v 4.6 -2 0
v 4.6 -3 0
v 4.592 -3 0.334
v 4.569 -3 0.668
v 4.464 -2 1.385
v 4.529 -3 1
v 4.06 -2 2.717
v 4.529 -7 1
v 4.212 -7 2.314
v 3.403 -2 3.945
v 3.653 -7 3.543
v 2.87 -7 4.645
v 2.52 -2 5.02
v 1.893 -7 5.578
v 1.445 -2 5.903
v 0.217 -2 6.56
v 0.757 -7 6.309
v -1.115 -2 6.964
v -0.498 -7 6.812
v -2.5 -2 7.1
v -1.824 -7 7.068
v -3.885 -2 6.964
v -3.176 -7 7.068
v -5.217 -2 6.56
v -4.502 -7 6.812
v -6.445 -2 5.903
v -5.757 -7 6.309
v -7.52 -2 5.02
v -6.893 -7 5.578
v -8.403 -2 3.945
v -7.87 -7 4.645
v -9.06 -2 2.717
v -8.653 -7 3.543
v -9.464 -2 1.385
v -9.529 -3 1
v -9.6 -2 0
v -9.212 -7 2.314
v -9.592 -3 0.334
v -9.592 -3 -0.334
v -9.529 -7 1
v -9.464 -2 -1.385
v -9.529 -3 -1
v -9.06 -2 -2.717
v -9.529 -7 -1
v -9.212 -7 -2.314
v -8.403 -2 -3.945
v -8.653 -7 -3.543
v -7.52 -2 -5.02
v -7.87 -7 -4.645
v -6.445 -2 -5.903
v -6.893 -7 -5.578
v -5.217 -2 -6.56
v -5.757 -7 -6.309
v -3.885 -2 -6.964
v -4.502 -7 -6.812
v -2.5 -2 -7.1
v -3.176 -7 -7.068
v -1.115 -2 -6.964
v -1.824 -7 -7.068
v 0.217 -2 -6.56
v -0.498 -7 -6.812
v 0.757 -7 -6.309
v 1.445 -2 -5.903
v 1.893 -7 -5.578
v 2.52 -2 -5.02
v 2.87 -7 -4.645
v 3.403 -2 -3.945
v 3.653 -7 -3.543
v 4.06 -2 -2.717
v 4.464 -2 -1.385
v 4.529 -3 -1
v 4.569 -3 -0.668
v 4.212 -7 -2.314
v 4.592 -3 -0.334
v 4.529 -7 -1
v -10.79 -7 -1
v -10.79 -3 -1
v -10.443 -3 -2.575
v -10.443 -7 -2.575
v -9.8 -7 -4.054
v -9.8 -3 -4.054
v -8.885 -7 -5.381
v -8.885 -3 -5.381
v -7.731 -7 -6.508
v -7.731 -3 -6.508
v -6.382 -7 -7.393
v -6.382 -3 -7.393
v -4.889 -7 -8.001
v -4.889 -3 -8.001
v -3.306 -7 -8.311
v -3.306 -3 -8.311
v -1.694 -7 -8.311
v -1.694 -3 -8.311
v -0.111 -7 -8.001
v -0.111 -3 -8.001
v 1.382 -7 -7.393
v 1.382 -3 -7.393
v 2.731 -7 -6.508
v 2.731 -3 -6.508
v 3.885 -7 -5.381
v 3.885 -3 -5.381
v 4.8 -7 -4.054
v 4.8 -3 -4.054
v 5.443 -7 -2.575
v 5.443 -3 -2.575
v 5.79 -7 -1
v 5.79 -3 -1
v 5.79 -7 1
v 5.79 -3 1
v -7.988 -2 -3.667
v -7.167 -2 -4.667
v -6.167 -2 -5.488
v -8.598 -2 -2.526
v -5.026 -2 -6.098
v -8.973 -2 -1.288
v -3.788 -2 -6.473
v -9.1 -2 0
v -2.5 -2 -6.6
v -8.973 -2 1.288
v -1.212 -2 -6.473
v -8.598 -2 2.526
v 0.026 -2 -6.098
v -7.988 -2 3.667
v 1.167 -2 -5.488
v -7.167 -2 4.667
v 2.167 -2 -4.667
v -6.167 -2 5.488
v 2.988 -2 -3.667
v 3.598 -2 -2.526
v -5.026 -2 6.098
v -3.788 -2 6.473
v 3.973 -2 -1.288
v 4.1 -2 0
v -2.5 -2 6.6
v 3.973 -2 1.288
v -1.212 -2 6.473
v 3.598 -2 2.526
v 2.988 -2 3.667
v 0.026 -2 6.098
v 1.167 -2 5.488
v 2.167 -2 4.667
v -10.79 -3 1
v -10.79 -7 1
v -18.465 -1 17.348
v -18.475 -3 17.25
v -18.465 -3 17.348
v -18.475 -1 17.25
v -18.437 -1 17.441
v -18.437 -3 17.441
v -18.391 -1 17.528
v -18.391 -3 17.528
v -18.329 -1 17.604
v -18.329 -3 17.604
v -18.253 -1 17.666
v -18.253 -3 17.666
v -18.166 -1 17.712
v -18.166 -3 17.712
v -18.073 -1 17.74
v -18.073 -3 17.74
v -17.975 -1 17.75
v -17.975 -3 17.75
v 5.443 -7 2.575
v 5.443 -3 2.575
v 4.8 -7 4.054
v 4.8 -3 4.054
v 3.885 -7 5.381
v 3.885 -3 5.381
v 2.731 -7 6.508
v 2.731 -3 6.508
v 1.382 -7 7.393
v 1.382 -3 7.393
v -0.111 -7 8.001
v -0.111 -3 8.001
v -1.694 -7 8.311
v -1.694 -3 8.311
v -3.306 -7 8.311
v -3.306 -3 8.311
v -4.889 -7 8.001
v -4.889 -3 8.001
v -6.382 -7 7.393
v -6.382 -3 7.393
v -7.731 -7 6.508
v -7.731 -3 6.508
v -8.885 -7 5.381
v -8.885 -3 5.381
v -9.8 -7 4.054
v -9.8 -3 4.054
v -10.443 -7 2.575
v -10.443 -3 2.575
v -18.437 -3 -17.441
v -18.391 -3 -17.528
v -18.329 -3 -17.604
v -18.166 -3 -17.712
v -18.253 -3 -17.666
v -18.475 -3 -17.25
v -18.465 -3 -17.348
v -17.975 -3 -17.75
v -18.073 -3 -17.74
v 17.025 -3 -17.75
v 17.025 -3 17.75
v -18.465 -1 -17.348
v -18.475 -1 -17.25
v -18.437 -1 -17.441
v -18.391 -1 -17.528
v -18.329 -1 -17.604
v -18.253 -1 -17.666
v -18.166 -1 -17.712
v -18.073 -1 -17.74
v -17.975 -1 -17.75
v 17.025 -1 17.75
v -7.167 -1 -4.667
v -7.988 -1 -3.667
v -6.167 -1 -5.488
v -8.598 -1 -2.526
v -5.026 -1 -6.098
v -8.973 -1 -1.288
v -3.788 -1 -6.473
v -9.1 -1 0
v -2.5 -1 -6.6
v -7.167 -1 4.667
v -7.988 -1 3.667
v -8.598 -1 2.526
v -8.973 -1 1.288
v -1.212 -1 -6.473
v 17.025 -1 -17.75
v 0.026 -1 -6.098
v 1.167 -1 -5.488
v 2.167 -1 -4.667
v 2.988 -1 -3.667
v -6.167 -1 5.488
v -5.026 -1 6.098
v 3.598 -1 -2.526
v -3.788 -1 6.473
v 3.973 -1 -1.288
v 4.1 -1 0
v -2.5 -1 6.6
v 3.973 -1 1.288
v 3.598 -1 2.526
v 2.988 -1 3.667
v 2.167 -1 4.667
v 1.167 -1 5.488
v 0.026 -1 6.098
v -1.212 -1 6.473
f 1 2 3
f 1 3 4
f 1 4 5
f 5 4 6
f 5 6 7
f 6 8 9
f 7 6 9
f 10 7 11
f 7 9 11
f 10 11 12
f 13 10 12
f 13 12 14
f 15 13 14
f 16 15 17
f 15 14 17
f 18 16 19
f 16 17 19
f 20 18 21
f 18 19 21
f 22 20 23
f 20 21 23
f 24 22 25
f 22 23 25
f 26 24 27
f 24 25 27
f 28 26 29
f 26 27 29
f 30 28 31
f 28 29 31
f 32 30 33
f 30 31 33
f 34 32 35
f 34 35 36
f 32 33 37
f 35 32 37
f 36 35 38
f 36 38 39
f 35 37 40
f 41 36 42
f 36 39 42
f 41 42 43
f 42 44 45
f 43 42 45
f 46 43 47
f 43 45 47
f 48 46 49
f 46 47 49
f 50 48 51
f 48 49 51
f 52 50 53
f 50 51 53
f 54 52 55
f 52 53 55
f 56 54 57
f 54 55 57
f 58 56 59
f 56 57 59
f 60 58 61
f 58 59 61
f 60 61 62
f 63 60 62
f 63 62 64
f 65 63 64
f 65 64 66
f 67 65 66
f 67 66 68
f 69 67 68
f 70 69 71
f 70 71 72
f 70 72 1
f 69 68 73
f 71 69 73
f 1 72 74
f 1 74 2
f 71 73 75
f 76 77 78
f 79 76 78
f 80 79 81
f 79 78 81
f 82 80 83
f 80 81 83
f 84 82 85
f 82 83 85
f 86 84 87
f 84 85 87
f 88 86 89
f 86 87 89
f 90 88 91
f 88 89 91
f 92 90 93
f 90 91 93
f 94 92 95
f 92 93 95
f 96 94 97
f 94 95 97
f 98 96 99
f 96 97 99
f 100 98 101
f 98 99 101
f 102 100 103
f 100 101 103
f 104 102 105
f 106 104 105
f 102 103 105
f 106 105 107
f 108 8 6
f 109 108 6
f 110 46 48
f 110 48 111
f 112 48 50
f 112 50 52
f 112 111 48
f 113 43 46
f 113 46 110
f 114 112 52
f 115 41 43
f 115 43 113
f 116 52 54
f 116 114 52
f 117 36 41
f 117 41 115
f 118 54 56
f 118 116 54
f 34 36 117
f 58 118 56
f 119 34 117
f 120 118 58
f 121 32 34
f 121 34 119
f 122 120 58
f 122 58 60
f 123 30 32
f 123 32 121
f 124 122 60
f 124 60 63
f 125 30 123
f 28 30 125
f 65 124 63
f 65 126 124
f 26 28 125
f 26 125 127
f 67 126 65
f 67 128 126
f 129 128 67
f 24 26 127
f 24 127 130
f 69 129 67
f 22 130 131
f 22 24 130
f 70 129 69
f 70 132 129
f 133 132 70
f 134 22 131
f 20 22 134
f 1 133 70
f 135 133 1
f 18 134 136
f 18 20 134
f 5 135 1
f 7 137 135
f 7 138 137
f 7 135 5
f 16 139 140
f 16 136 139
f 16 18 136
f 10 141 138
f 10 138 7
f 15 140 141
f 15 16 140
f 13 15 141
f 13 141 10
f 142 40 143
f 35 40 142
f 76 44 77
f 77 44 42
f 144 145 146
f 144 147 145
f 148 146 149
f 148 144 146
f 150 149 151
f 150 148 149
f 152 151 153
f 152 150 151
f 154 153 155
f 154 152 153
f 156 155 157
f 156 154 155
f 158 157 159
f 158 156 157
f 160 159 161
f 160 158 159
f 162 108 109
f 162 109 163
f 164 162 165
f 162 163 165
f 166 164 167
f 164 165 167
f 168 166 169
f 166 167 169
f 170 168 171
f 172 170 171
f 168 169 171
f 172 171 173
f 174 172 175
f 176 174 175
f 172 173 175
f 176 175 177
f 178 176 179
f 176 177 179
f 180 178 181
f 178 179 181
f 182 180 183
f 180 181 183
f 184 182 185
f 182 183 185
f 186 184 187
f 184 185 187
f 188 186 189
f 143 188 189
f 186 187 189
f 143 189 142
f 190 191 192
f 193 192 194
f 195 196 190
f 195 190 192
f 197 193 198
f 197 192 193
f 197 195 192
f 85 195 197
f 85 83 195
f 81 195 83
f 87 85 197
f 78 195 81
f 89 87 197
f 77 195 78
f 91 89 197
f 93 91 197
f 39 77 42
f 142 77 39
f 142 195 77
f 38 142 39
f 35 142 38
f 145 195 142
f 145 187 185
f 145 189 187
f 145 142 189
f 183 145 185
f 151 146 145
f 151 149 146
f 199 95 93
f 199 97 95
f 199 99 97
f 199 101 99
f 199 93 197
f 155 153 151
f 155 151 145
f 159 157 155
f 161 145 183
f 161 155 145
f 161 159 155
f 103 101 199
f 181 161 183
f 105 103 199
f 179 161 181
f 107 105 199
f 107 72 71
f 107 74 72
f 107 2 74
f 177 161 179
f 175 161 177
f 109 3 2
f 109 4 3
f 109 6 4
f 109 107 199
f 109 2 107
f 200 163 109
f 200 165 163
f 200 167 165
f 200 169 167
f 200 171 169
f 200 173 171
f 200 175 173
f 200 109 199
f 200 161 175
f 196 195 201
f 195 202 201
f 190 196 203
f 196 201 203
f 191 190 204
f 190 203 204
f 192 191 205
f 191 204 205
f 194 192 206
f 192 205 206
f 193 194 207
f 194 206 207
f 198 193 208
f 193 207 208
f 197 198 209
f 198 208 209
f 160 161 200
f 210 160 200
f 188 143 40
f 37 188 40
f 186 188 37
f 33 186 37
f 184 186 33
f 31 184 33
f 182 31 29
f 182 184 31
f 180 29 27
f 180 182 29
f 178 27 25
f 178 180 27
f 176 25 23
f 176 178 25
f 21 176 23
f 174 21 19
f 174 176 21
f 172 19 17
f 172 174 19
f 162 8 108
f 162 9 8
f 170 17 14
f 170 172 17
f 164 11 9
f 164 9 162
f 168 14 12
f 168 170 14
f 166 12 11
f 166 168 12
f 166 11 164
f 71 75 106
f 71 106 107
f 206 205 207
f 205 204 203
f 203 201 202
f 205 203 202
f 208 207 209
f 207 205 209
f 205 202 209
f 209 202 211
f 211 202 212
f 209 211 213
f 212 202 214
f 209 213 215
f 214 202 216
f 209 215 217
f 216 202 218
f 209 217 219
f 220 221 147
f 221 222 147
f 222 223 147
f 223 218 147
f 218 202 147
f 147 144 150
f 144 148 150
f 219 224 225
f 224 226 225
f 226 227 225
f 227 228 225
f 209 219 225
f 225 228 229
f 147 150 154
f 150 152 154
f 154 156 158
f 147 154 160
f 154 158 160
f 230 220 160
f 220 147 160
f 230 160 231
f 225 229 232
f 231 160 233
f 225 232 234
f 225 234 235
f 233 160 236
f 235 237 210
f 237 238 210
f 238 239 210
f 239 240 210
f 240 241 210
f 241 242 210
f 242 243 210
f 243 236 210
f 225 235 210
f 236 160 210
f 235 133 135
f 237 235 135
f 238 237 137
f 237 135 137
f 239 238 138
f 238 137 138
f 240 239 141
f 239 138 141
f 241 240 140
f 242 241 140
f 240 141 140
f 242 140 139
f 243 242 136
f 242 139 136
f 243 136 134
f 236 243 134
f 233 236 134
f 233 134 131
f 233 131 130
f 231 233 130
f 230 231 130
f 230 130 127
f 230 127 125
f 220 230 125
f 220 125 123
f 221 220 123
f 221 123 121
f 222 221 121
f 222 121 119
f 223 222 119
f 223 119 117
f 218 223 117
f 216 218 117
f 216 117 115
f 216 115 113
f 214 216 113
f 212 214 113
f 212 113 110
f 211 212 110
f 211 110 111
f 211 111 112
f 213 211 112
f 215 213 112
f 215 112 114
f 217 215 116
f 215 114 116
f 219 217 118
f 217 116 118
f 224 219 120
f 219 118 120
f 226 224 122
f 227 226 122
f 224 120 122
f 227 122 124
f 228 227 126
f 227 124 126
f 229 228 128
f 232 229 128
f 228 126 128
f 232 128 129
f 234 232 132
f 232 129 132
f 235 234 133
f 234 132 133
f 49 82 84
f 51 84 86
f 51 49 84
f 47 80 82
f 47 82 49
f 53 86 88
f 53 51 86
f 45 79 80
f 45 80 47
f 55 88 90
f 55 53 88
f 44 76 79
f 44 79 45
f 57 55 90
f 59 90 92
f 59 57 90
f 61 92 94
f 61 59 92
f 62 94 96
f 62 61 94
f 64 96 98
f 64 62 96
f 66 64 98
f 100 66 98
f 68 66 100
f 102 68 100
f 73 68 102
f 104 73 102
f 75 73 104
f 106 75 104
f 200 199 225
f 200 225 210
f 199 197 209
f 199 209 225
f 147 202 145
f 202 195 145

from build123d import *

# Parameters (mm, degrees)
SKETCH_R          = 8.35
SKETCH_R_2        = 7.1
PAD_DEPTH         = 4
SKETCH001_W       = 35.5
SKETCH001_H       = 35.5
SKETCH001_R       = 6.6
PAD001_DEPTH      = 2
SKETCH002_W       = 4
SKETCH002_H       = 2
POCKET_DEPTH      = 25
POCKET_DEPTH_BACK = 25
FILLET002_R       = 0.5
SKETCH010_R       = 7.1
POCKET002_DEPTH   = 1


with BuildPart() as part:
    # Sketch → Pad (new body)
    with BuildSketch(Plane.XZ):
        Circle(SKETCH_R)
        Circle(SKETCH_R_2, mode=Mode.SUBTRACT)
    extrude(amount=PAD_DEPTH)

    # Sketch001 → Pad001 (join)
    with BuildSketch(Plane.XZ):
        with Locations((1.775, 0)):
            Rectangle(SKETCH001_W, SKETCH001_H)
        Circle(SKETCH001_R, mode=Mode.SUBTRACT)
    extrude(amount=-PAD001_DEPTH)

    # Sketch002 (on DatumPlane) → Pocket (cut, two sides)
    with BuildSketch(Plane.YZ) as pocket_sk:
        with Locations((-2, 0)):
            Rectangle(SKETCH002_W, SKETCH002_H)
    extrude(amount=-POCKET_DEPTH, mode=Mode.SUBTRACT)
    extrude(pocket_sk.sketch, amount=POCKET_DEPTH_BACK, mode=Mode.SUBTRACT)

    # Fillet002
    fillet002_edges = [part.edges().sort_by_distance(p)[0] for p in [
        (-15.975, 1, -17.75),
        (-15.975, 1, 17.75),
    ]]
    fillet(fillet002_edges, radius=FILLET002_R)

    # Sketch010 → Pocket002 (cut)
    with BuildSketch(Plane.XZ):
        Circle(SKETCH010_R)
    extrude(amount=-POCKET002_DEPTH, mode=Mode.SUBTRACT)


with BuildPart() as part_1:
    # Body placement: moved
    add(part.part.moved(Location((-2.5, -3, 0))))


solid = part_1.part
